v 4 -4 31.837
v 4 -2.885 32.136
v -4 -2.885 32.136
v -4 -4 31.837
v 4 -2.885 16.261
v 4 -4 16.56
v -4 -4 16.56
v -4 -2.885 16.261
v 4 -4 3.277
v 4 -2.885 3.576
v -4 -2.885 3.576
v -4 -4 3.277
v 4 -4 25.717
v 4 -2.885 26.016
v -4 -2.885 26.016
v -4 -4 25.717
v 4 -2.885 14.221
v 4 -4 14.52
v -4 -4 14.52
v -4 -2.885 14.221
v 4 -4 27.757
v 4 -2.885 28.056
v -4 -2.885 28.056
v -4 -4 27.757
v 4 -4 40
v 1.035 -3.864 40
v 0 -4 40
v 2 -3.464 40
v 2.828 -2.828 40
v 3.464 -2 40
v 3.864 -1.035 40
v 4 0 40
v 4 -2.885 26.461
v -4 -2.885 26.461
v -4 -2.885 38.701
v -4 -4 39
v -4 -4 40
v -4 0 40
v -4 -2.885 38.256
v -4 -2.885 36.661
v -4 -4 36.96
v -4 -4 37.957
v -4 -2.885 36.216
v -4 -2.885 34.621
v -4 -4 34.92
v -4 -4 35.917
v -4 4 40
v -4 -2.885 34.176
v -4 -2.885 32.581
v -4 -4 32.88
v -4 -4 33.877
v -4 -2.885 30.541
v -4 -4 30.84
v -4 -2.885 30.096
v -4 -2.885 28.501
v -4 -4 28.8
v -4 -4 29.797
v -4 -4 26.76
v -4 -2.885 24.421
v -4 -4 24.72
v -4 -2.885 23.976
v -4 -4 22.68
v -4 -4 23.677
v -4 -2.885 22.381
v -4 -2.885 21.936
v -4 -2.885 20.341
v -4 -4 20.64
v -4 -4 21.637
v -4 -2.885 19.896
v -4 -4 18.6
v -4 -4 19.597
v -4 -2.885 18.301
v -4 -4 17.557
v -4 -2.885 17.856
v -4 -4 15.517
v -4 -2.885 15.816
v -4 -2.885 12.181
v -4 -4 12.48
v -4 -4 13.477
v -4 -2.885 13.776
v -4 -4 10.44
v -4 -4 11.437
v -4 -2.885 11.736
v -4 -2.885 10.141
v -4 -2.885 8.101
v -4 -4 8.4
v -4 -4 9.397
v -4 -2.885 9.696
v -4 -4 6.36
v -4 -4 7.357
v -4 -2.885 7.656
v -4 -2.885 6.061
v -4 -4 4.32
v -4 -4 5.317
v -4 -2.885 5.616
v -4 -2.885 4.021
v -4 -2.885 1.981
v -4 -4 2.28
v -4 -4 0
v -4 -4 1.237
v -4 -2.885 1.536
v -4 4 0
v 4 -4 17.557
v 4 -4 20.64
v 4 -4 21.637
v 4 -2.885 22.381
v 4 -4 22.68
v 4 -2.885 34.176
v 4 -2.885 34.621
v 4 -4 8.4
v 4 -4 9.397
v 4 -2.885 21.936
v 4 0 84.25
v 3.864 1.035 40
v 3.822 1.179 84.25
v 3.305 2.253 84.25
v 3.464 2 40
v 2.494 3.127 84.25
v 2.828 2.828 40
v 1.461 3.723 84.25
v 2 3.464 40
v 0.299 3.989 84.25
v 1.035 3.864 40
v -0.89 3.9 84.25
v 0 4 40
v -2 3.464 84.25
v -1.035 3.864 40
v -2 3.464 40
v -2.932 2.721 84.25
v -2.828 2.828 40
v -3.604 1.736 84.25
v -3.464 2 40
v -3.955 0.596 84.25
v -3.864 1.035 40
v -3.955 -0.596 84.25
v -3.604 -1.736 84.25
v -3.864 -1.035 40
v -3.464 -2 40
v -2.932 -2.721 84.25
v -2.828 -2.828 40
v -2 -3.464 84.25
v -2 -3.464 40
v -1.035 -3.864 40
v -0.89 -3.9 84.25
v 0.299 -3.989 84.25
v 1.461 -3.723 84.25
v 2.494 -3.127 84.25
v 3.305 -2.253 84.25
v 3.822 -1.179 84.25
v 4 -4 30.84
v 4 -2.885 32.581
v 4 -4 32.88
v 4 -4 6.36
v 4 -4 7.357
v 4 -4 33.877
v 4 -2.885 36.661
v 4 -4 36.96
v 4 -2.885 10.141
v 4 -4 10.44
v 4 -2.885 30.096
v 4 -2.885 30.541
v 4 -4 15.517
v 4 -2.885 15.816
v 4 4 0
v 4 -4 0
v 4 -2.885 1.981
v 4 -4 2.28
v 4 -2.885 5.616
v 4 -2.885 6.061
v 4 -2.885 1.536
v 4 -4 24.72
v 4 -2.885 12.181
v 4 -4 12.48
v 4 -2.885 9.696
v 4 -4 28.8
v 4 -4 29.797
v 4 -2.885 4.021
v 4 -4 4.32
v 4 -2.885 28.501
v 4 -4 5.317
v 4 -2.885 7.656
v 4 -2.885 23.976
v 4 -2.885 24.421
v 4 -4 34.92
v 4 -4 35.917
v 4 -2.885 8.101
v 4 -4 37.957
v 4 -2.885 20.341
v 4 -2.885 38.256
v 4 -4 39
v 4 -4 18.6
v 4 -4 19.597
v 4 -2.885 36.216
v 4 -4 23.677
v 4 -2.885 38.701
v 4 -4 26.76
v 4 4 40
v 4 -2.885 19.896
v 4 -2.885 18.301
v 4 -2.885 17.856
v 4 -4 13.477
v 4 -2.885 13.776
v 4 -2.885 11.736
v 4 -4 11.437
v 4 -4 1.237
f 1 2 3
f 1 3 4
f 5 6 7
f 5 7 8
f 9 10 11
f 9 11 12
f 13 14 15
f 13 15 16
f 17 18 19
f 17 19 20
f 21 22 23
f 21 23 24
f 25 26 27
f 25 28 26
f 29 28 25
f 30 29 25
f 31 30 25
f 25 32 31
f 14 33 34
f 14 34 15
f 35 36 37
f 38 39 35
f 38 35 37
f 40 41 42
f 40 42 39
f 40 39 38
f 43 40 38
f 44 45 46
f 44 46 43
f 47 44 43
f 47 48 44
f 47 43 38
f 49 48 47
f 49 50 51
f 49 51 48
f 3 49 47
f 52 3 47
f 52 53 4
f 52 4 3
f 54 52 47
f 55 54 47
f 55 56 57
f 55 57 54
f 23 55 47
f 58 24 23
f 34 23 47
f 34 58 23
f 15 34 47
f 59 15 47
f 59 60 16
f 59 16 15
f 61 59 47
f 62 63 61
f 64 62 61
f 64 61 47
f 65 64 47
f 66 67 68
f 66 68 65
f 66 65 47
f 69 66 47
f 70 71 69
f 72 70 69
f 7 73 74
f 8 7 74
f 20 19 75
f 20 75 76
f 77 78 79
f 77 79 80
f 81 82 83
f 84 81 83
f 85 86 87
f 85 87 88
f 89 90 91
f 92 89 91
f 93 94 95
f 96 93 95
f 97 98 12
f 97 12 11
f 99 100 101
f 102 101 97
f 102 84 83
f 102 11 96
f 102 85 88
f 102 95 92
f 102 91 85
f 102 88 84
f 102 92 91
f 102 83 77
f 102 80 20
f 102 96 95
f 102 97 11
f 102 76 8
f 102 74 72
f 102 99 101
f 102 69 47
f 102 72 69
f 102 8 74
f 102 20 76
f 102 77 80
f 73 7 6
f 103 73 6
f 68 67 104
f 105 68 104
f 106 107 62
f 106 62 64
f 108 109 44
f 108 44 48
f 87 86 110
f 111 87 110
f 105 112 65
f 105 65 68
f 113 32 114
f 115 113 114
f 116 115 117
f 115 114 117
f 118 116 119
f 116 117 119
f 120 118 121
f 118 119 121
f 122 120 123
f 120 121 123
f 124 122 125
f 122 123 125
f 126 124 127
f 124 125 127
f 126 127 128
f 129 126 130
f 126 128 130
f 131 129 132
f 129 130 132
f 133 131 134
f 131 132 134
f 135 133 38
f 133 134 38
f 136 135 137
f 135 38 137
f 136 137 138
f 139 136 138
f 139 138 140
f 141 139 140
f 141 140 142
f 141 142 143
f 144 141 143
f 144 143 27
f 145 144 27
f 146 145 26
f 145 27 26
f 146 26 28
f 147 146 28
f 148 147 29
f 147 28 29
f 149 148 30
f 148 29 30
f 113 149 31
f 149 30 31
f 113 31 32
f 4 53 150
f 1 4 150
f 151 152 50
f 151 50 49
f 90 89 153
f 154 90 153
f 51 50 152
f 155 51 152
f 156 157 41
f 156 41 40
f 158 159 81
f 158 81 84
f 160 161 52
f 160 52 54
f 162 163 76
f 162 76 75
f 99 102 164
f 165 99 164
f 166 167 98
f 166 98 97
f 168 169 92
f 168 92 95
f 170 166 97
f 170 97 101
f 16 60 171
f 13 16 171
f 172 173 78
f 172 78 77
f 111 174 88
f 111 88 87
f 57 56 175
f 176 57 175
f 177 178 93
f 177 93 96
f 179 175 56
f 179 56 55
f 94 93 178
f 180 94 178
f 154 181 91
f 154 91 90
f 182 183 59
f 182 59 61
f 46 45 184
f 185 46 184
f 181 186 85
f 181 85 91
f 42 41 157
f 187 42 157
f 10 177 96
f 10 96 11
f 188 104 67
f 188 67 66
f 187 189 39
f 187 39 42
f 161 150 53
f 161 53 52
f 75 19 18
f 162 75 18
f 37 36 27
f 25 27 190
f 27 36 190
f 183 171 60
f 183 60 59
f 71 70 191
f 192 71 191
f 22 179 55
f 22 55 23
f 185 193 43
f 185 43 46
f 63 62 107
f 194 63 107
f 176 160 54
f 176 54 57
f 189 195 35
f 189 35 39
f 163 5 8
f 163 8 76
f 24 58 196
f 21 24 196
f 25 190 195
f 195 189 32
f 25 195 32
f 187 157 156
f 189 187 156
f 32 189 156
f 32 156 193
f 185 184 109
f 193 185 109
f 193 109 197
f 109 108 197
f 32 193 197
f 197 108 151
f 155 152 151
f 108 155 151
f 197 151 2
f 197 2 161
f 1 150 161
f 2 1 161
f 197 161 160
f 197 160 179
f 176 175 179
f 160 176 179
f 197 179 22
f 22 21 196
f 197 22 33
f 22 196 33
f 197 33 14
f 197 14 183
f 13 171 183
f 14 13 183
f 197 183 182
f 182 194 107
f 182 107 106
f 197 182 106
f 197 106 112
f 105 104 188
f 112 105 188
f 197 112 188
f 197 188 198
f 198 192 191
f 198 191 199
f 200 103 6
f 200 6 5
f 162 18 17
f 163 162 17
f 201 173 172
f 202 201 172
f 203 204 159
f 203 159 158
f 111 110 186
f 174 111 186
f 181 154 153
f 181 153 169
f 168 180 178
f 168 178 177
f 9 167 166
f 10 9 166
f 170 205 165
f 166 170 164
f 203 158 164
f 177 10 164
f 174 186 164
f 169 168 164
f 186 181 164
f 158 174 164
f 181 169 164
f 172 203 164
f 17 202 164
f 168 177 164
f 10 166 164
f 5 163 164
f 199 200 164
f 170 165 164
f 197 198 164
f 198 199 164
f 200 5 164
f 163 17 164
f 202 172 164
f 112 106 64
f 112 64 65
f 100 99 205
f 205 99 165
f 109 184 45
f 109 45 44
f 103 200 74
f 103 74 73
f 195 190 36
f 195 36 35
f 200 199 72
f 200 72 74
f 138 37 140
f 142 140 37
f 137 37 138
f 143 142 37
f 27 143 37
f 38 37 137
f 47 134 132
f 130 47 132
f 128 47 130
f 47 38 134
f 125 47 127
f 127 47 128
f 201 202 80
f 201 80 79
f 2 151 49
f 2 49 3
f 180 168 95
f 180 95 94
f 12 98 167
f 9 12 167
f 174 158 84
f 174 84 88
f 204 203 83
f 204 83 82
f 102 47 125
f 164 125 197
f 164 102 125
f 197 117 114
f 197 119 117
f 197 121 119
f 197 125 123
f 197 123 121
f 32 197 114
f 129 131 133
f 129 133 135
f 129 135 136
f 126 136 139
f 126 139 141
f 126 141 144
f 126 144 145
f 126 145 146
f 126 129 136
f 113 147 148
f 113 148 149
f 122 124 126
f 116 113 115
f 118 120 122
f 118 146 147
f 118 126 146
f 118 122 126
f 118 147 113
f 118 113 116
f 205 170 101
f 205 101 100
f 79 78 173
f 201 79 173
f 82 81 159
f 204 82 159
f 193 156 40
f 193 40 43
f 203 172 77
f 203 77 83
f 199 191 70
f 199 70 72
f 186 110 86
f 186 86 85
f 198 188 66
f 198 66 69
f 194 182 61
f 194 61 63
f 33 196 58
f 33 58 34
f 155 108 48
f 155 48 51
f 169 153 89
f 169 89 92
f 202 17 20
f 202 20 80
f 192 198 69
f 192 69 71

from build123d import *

# Parameters (mm, degrees)
CROQUIS1_W              = 8
CROQUIS1_H              = 8
EXTRUIR1_DEPTH          = 40
CORTAR_EXTRUIR3_DEPTH   = 8
CROQUIS5_R              = 4
SALIENTE_EXTRUIR1_DEPTH = 44.25


with BuildPart() as part:
    # Croquis1 → Extruir1 (new body)
    with BuildSketch(Plane.XY):
        Rectangle(CROQUIS1_W, CROQUIS1_H)
    extrude(amount=EXTRUIR1_DEPTH)

    # Croquis4 → Cortar-Extruir3 (cut)
    with BuildSketch(Plane(origin=(4, 0, 0), x_dir=(0, 0, -1), z_dir=(1, 0, 0))):
        Polygon((-36.96, -4), (-36.6612042, -2.884878893), (-36.21598653, -2.884878893), (-35.91719073, -4), align=None)
        Polygon((-39, -4), (-38.7012042, -2.884878893), (-38.25598653, -2.884878893), (-37.95719073, -4), align=None)
        Polygon((-34.92, -4), (-34.6212042, -2.884878893), (-34.17598653, -2.884878893), (-33.87719073, -4), align=None)
        Polygon((-32.88, -4), (-32.5812042, -2.884878893), (-32.13598653, -2.884878893), (-31.83719073, -4), align=None)
        Polygon((-30.84, -4), (-30.5412042, -2.884878893), (-30.09598653, -2.884878893), (-29.79719073, -4), align=None)
        Polygon((-28.8, -4), (-28.5012042, -2.884878893), (-28.05598653, -2.884878893), (-27.75719073, -4), align=None)
        Polygon((-26.76, -4), (-26.4612042, -2.884878893), (-26.01598653, -2.884878893), (-25.71719073, -4), align=None)
        Polygon((-24.72, -4), (-24.4212042, -2.884878893), (-23.97598653, -2.884878893), (-23.67719073, -4), align=None)
        Polygon((-22.68, -4), (-22.3812042, -2.884878893), (-21.93598653, -2.884878893), (-21.63719073, -4), align=None)
        Polygon((-20.64, -4), (-20.3412042, -2.884878893), (-19.89598653, -2.884878893), (-19.59719073, -4), align=None)
        Polygon((-18.6, -4), (-18.3012042, -2.884878893), (-17.85598653, -2.884878893), (-17.55719073, -4), align=None)
        Polygon((-16.56, -4), (-16.2612042, -2.884878893), (-15.81598653, -2.884878893), (-15.51719073, -4), align=None)
        Polygon((-14.52, -4), (-14.2212042, -2.884878893), (-13.77598653, -2.884878893), (-13.47719073, -4), align=None)
        Polygon((-12.48, -4), (-12.1812042, -2.884878893), (-11.73598653, -2.884878893), (-11.43719073, -4), align=None)
        Polygon((-10.44, -4), (-10.1412042, -2.884878893), (-9.69598653, -2.884878893), (-9.39719073, -4), align=None)
        Polygon((-8.4, -4), (-8.1012042, -2.884878893), (-7.65598653, -2.884878893), (-7.35719073, -4), align=None)
        Polygon((-6.36, -4), (-6.0612042, -2.884878893), (-5.61598653, -2.884878893), (-5.31719073, -4), align=None)
        Polygon((-4.32, -4), (-4.0212042, -2.884878893), (-3.57598653, -2.884878893), (-3.27719073, -4), align=None)
        Polygon((-2.28, -4), (-1.9812042, -2.884878893), (-1.53598653, -2.884878893), (-1.23719073, -4), align=None)
    extrude(amount=-CORTAR_EXTRUIR3_DEPTH, mode=Mode.SUBTRACT)

    # Croquis5 → Saliente-Extruir1 (add)
    with BuildSketch(Plane.XY.offset(40)):
        Circle(CROQUIS5_R)
    extrude(amount=SALIENTE_EXTRUIR1_DEPTH)


solid = part.part
